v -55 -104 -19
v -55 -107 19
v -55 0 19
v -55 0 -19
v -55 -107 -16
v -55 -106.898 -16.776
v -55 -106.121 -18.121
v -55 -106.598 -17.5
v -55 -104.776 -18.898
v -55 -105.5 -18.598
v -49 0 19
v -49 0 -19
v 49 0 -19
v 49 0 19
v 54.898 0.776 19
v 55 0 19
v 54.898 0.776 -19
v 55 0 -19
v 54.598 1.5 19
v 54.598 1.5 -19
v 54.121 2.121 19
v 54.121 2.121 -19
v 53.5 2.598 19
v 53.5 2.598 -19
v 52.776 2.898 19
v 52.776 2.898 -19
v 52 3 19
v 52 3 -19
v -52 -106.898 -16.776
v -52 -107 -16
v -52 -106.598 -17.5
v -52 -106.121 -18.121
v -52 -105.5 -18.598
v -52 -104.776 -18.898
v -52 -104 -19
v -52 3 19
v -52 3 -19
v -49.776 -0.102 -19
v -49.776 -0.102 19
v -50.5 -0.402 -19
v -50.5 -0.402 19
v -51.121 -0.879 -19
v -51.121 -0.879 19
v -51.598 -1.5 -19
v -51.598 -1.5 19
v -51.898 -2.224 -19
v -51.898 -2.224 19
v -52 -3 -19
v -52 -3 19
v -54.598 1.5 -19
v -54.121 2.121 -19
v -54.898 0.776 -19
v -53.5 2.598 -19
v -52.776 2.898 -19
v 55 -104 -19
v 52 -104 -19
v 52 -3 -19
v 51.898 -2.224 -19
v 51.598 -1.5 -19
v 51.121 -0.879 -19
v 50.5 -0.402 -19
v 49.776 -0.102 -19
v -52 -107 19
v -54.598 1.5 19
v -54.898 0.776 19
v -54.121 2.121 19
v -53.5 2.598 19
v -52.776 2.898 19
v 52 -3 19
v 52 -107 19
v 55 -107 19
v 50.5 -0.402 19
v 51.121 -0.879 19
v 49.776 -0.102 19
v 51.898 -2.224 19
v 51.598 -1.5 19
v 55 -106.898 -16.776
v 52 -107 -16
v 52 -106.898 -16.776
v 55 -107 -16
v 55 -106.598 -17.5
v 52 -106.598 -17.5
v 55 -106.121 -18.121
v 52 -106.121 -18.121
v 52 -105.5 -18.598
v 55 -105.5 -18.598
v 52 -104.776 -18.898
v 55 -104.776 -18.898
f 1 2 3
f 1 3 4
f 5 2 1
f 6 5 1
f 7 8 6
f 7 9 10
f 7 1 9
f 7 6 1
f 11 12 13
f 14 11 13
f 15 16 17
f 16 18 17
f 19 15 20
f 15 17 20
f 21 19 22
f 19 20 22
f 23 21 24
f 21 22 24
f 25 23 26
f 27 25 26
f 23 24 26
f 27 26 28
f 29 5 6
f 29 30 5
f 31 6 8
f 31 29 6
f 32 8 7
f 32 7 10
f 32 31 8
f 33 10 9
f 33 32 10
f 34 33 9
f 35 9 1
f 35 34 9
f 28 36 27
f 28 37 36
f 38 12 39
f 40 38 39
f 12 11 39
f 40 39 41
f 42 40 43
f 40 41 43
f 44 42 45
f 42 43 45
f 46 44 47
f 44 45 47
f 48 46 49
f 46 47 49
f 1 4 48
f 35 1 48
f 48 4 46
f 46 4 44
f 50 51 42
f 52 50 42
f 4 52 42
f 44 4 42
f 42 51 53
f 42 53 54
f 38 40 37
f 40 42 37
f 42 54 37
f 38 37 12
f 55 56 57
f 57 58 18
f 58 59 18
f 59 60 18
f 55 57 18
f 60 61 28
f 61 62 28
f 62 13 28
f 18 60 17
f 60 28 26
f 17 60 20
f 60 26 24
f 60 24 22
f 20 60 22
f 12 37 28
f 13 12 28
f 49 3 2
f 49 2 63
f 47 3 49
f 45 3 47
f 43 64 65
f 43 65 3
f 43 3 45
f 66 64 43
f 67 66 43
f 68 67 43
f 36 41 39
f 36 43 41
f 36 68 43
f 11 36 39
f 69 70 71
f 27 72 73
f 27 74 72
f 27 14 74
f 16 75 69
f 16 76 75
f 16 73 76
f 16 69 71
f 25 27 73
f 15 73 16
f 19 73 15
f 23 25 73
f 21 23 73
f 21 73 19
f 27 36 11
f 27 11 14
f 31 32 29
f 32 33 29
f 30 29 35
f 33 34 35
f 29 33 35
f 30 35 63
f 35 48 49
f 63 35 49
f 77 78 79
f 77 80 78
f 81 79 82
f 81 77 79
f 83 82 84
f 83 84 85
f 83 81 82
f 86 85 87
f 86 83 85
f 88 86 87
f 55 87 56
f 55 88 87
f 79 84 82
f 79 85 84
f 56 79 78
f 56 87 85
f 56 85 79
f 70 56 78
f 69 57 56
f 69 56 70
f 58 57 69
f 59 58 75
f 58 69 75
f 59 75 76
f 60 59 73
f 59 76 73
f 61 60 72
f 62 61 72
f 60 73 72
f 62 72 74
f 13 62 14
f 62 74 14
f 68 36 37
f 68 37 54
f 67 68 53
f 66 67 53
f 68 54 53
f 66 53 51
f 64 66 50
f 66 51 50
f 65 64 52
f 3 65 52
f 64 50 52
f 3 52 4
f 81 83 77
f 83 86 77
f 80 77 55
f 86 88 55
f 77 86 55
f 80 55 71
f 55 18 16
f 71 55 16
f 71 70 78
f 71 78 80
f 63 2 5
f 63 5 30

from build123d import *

# Parameters (mm, degrees)
SKETCH_1_W      = 3
SKETCH_1_H      = 38
SKETCH_1_W_2    = 104
EXTRUDE_1_DEPTH = 3
SKETCH_4_W      = 3
SKETCH_4_H      = 38
EXTRUDE_3_DEPTH = 107
FILLET_1_R      = 3
FILLET_2_R      = 3
FILLET_3_R      = 3
FILLET_5_R      = 3


with BuildPart() as part:
    # 草图1 → 凸台-拉伸1 (new body)
    with BuildSketch(Plane(origin=(0, 0, 0), x_dir=(1, 0, 0), z_dir=(0, 1, 0))):
        with Locations((-53.5, 0)):
            Rectangle(SKETCH_1_W, SKETCH_1_H)
        Rectangle(SKETCH_1_W_2, SKETCH_1_H)
        with Locations((53.5, 0)):
            Rectangle(SKETCH_1_W, SKETCH_1_H)
    extrude(amount=EXTRUDE_1_DEPTH)

    # 草图4 → 凸台-拉伸3 (add)
    with BuildSketch(Plane.XZ):
        with Locations((53.5, 0)):
            Rectangle(SKETCH_4_W, SKETCH_4_H)
        with Locations((-53.5, 0)):
            Rectangle(SKETCH_4_W, SKETCH_4_H)
    extrude(amount=EXTRUDE_3_DEPTH)

    # 圆角1
    fillet_1_edges = [part.edges().sort_by_distance(p)[0] for p in [
        (-55, 3, 0),
        (55, 3, 0),
    ]]
    fillet(fillet_1_edges, radius=FILLET_1_R)

    # 圆角2
    fillet_2_edges = [part.edges().sort_by_distance(p)[0] for p in [
        (52, 0, 0),
    ]]
    fillet(fillet_2_edges, radius=FILLET_2_R)

    # 圆角3
    fillet_3_edges = [part.edges().sort_by_distance(p)[0] for p in [
        (-52, 0, 0),
    ]]
    fillet(fillet_3_edges, radius=FILLET_3_R)

    # 圆角5
    fillet_5_edges = [part.edges().sort_by_distance(p)[0] for p in [
        (53.5, -107, -19),
        (-53.5, -107, -19),
    ]]
    fillet(fillet_5_edges, radius=FILLET_5_R)


solid = part.part
